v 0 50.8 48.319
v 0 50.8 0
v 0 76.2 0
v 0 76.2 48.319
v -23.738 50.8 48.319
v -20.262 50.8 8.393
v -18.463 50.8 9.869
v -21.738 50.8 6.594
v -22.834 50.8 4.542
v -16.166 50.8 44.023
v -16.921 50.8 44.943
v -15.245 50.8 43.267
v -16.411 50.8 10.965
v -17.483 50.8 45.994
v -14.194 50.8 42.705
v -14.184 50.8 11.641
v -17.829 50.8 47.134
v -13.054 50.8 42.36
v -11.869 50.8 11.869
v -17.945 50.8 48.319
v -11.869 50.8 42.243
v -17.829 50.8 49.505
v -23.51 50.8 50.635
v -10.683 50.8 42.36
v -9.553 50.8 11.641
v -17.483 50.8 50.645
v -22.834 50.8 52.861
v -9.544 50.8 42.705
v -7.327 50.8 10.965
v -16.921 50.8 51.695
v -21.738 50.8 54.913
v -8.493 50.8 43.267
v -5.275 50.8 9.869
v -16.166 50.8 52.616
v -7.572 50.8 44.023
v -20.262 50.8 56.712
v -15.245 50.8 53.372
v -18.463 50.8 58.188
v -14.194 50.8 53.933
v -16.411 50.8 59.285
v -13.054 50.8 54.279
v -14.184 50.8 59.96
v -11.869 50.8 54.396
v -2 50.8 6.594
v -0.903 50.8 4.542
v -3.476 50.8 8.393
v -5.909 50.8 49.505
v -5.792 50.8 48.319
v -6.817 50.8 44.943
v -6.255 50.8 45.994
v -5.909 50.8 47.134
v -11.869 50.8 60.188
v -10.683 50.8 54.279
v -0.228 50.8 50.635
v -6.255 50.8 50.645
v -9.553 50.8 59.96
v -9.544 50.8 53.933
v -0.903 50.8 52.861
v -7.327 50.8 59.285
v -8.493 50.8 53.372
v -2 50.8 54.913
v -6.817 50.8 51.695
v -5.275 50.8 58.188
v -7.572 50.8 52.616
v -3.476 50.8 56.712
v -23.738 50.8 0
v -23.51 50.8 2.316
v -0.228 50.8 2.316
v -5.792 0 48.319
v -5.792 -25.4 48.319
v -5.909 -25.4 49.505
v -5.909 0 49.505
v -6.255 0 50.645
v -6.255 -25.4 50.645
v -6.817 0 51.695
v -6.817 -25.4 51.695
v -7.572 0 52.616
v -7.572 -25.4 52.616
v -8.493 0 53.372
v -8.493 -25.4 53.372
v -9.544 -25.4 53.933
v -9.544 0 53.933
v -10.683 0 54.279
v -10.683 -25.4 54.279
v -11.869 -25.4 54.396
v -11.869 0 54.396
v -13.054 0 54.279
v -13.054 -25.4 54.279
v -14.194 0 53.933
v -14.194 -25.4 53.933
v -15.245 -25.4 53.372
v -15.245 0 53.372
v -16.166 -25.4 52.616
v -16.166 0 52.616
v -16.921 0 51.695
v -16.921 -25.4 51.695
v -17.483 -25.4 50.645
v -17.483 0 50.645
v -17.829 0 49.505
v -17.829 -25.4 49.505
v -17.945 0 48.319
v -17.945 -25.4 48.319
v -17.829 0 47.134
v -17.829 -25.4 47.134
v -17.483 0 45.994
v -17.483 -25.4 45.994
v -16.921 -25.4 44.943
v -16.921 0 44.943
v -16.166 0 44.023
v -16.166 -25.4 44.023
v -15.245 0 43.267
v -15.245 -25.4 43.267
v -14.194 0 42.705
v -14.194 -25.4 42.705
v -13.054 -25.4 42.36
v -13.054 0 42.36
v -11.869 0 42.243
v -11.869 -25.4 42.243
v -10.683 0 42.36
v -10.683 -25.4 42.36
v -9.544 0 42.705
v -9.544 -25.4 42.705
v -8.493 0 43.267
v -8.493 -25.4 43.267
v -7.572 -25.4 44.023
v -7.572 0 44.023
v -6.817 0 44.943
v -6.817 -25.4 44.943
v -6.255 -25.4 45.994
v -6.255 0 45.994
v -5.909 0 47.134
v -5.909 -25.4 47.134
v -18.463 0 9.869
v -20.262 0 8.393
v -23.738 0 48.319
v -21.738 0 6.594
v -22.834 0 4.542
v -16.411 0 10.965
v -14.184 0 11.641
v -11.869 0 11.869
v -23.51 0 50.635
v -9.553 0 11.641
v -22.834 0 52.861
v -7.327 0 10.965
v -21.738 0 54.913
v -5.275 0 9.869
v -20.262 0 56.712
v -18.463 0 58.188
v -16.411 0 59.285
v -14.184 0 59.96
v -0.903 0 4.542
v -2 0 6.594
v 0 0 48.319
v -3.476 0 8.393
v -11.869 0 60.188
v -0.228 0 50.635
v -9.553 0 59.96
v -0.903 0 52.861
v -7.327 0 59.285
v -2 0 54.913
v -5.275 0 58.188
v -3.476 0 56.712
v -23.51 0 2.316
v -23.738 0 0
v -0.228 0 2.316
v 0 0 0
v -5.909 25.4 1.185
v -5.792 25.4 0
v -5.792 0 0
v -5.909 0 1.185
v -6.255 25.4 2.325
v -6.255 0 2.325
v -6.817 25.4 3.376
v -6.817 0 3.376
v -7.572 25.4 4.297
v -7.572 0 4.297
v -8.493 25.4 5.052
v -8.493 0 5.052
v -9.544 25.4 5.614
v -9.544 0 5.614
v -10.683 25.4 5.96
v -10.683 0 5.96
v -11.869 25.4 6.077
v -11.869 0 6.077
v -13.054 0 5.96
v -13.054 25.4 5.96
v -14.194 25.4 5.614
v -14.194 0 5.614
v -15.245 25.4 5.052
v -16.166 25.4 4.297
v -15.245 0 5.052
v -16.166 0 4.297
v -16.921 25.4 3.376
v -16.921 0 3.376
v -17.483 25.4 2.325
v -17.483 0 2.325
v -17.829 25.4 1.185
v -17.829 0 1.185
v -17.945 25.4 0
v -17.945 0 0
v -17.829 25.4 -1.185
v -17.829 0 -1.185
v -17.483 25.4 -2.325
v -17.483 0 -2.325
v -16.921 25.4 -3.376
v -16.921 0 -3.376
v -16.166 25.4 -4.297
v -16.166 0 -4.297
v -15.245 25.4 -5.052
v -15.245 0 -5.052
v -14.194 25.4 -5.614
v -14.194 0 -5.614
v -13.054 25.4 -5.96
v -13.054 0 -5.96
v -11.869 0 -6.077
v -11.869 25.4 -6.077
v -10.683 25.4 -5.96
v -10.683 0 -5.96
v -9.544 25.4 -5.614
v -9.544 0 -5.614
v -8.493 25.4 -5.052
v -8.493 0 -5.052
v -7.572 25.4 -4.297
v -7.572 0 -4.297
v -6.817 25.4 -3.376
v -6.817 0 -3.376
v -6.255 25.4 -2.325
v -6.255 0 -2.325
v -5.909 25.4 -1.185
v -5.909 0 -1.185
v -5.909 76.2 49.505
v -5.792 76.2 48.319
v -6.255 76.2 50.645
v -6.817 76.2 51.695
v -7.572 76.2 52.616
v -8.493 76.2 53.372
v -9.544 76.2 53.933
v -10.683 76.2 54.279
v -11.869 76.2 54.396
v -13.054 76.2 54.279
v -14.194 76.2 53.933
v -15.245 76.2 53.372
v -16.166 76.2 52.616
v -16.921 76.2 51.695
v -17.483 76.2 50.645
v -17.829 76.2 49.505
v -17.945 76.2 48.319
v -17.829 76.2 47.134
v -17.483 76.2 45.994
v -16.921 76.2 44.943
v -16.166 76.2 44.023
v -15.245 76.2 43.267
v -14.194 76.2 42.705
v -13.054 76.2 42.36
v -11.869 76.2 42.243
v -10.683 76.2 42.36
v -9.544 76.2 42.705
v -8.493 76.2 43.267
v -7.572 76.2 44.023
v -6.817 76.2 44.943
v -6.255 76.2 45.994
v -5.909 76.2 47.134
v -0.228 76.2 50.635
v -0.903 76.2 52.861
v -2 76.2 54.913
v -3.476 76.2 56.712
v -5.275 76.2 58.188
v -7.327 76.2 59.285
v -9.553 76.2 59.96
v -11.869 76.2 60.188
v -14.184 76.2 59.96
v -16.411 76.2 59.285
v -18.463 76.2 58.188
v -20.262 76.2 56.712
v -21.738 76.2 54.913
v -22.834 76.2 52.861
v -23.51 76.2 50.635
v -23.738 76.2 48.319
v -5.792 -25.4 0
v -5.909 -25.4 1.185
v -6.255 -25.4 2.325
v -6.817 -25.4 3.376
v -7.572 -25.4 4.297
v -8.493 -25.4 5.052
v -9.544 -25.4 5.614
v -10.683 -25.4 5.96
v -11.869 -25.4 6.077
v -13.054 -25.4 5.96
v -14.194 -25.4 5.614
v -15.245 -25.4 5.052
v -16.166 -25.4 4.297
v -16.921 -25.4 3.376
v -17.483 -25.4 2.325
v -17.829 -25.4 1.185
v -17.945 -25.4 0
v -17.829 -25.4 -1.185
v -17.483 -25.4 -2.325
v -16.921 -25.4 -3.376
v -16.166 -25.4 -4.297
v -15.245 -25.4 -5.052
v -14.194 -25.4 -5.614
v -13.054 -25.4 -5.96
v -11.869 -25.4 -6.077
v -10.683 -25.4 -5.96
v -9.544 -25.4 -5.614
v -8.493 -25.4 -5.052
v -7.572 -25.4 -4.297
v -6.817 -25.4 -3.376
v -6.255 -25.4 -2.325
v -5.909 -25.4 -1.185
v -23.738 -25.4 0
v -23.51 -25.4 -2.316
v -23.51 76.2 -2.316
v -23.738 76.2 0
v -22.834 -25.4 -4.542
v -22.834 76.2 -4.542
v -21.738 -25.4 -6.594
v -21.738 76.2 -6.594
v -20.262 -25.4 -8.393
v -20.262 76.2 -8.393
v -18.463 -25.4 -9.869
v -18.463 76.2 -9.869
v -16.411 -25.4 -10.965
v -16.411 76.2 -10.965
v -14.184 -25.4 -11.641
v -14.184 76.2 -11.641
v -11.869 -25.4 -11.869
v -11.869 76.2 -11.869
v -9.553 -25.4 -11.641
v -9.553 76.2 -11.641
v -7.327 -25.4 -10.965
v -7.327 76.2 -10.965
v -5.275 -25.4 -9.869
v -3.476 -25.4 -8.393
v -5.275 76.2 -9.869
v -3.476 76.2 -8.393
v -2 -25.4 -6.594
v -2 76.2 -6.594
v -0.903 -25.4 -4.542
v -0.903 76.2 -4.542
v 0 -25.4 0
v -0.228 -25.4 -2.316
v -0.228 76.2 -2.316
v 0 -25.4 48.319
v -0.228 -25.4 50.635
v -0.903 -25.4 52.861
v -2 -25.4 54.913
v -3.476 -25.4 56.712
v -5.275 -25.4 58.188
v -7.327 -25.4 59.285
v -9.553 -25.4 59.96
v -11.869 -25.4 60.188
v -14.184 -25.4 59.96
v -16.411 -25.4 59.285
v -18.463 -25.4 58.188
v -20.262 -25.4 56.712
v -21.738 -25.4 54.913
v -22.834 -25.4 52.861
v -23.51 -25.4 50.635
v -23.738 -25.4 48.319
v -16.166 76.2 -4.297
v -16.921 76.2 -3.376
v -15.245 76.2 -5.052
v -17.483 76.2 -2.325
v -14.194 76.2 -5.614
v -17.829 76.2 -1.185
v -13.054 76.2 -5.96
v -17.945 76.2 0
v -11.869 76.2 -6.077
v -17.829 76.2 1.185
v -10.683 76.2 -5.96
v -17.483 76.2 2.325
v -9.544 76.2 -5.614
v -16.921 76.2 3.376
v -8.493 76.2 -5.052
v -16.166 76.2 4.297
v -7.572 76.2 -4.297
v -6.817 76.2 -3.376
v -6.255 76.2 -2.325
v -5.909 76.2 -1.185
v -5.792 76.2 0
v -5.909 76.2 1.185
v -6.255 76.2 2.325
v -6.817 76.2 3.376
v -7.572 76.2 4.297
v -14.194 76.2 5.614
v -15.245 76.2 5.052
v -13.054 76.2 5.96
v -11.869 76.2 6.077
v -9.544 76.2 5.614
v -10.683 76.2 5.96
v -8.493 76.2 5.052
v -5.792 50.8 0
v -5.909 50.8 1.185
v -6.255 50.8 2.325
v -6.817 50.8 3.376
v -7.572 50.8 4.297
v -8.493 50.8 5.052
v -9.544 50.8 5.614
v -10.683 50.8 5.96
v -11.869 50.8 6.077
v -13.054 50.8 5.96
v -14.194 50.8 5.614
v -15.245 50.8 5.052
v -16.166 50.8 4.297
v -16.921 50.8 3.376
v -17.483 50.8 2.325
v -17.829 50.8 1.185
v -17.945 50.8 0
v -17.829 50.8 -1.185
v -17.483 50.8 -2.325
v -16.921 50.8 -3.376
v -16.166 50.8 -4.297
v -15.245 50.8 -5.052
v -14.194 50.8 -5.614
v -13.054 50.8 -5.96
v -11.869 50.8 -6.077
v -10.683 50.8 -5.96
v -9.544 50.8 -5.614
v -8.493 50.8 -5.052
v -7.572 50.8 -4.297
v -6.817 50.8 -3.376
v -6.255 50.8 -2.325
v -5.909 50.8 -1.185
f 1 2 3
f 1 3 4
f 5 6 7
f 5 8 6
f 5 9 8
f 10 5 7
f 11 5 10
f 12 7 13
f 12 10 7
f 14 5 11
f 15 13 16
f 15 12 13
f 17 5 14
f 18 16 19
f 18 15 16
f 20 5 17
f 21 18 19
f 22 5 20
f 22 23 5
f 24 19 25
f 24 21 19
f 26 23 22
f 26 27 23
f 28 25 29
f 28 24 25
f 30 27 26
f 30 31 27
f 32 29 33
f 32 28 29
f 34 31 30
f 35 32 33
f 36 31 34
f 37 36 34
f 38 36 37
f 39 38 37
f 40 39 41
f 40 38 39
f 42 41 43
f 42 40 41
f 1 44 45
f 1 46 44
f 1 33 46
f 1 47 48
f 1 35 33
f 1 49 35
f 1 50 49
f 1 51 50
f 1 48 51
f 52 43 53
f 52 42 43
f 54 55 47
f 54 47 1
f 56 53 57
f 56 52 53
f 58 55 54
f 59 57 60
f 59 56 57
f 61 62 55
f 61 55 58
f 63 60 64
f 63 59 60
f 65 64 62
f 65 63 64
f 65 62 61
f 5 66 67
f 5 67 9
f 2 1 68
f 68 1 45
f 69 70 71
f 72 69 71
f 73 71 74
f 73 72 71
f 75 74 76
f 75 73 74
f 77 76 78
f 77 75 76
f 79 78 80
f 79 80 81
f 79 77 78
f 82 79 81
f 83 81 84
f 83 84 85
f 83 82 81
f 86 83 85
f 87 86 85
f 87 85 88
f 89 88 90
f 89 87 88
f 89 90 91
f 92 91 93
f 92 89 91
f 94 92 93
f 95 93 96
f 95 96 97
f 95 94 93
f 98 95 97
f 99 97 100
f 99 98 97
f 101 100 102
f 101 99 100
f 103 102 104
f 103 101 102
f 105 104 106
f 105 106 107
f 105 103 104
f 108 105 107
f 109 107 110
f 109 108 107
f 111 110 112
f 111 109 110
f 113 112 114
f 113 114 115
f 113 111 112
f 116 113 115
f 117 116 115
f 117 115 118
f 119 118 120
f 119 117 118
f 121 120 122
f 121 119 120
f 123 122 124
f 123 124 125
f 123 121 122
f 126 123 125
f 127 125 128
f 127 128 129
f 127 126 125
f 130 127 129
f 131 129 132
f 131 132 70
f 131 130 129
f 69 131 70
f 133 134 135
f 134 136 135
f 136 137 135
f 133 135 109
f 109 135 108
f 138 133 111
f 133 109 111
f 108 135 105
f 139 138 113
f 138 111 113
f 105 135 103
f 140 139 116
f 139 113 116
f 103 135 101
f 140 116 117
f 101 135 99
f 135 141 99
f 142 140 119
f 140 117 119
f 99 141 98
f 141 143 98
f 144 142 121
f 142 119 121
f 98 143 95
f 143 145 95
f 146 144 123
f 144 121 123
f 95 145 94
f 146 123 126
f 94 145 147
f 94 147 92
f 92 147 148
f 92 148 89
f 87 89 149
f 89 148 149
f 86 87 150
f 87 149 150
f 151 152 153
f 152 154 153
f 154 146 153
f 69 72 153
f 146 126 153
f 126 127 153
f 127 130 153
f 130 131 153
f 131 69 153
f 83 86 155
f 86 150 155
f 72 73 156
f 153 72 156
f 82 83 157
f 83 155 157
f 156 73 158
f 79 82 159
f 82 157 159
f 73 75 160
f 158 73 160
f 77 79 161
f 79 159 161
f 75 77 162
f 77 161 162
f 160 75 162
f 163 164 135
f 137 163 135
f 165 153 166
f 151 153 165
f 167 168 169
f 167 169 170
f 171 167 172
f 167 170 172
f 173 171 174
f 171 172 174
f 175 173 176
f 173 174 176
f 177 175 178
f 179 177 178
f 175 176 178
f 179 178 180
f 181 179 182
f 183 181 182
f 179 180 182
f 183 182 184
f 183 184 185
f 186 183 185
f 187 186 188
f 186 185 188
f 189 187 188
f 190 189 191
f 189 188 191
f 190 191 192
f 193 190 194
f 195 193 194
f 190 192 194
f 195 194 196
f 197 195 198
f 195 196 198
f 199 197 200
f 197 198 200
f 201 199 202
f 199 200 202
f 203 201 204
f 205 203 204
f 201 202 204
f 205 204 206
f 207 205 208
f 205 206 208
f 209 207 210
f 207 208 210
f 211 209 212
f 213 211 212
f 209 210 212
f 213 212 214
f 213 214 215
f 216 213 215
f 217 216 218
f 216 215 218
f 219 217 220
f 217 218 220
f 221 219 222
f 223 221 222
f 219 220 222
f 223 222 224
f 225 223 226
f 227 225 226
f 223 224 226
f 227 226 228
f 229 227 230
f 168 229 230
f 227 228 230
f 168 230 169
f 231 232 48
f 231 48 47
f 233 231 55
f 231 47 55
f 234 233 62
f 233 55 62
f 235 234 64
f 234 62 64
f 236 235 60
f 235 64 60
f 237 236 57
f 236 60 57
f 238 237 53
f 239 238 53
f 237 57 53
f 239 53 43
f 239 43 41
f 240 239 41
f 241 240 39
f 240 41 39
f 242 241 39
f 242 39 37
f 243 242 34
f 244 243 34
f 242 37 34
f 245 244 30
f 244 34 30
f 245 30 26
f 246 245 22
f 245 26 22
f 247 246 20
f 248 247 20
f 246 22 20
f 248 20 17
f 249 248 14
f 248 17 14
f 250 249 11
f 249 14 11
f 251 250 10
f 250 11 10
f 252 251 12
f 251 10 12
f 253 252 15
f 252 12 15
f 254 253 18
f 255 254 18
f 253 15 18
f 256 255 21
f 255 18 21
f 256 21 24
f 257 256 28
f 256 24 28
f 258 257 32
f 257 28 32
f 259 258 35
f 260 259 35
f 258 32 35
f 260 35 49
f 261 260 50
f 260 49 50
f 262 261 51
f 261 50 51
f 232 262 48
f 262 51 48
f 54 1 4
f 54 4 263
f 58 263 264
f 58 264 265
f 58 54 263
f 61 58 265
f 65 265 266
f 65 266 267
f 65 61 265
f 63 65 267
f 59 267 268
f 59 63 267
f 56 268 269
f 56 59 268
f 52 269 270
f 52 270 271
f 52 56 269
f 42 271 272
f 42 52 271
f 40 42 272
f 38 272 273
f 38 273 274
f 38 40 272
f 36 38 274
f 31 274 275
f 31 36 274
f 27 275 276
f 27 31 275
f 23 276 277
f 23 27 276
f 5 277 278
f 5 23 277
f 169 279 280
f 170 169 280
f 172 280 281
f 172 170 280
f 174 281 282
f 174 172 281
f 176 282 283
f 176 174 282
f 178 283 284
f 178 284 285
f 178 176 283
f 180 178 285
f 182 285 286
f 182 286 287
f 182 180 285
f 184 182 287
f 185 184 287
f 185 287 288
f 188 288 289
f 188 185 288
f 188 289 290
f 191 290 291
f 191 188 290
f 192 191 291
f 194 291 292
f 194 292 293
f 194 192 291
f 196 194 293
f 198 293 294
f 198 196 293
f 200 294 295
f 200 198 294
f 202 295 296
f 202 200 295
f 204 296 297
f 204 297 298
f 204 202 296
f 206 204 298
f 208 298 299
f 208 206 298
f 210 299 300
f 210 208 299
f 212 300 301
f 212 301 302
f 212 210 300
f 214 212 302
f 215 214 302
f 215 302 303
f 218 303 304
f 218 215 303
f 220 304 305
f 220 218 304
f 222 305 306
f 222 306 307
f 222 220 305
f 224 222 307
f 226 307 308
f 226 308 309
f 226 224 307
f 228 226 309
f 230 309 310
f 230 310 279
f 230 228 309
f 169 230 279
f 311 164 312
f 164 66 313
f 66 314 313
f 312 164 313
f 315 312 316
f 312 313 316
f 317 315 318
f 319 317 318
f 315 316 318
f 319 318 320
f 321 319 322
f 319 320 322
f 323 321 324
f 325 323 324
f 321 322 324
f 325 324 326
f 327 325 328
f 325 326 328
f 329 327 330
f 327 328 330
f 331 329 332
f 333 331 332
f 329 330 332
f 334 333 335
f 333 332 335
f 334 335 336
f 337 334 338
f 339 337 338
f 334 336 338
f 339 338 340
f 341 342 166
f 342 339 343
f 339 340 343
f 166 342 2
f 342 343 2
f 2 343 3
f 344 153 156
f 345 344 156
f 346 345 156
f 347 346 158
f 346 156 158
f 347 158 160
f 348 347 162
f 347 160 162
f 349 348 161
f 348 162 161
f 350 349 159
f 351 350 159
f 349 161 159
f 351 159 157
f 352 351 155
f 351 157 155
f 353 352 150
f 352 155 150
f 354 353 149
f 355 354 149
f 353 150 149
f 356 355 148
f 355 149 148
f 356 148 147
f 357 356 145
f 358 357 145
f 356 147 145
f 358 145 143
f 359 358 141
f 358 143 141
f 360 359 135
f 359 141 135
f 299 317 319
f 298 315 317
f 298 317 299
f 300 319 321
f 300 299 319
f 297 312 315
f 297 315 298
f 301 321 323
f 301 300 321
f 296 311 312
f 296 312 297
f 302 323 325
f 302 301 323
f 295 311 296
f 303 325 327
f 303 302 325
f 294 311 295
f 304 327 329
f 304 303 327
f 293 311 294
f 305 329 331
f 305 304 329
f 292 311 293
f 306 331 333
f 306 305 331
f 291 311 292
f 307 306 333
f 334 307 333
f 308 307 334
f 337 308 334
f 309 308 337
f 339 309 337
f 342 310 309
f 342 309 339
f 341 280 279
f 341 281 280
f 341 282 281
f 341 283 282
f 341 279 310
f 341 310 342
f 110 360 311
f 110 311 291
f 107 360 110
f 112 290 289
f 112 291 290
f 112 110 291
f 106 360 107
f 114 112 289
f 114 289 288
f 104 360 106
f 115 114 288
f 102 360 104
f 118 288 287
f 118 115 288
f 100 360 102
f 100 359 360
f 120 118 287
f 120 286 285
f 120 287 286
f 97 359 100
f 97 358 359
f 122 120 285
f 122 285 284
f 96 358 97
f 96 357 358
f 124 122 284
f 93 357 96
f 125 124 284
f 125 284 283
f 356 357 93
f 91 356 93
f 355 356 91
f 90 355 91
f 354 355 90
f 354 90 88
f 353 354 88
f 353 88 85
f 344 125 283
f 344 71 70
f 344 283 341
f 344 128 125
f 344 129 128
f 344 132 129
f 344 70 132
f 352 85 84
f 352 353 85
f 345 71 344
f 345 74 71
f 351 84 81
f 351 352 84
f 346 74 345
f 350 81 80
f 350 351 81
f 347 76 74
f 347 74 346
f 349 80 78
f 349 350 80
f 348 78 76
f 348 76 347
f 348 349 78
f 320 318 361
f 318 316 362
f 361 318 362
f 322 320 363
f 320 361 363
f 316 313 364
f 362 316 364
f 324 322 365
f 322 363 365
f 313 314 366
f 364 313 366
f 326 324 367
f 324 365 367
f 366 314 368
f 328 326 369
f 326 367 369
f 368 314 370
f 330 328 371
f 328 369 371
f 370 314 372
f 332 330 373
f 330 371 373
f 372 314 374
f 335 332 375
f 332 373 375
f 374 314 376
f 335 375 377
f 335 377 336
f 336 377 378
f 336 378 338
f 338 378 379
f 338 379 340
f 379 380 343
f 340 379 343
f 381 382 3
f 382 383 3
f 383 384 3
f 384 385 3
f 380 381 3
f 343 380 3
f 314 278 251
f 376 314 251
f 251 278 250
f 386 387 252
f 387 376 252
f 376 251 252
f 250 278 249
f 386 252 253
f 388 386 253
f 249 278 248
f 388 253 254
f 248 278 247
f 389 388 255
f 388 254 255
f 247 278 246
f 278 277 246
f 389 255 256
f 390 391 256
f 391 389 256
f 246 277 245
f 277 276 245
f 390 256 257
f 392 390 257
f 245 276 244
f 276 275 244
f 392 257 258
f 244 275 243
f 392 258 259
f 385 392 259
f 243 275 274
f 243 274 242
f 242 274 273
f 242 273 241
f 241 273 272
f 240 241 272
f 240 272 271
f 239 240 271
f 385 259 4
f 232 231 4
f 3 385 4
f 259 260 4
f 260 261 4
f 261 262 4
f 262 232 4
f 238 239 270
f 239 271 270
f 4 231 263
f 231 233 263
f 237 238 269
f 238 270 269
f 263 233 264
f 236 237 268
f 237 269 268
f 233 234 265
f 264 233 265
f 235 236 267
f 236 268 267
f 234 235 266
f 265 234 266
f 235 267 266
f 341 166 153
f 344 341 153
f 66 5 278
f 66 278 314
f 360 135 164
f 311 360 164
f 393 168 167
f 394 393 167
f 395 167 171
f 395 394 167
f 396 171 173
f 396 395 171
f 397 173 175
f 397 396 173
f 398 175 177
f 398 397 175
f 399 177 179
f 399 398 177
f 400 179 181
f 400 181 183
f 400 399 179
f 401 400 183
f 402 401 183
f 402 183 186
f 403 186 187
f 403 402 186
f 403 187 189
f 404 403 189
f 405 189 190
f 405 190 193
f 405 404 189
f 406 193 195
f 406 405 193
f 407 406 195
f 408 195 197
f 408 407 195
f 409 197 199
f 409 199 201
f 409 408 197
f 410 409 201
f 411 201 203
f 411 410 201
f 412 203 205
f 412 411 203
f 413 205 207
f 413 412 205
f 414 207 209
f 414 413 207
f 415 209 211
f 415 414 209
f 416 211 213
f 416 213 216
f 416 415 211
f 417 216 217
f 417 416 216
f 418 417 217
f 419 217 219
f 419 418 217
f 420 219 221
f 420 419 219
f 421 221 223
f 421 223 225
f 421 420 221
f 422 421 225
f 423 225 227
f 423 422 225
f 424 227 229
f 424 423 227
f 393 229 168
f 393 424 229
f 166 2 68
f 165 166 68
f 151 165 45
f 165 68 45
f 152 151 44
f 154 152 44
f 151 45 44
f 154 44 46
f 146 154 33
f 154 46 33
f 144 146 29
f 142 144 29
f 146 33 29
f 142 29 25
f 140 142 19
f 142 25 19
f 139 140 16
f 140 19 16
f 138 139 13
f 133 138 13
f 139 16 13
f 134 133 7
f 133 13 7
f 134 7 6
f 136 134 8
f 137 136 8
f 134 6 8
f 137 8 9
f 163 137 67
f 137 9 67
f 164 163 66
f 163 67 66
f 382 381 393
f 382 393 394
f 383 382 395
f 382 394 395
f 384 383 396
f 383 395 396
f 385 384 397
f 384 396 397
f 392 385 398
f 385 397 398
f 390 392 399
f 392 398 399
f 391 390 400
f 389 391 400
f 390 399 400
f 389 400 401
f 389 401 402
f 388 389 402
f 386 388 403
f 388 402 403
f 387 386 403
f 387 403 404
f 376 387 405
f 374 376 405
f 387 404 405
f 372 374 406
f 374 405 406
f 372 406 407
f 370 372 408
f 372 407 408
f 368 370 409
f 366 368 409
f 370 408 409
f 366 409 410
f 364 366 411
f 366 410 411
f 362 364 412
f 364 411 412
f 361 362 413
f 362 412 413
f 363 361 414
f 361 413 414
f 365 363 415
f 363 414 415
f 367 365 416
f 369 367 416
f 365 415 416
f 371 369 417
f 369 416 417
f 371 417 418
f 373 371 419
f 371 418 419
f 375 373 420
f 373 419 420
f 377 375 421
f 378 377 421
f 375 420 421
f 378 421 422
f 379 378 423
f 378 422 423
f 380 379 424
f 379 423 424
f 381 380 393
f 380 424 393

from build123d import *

# Parameters (mm, degrees)
F0_R     = 6.076519
F1_DEPTH = 25.4
F2_DEPTH = 25.4


with BuildPart() as f1:
    # F0 (on Front) → F1 (new body)
    with BuildSketch(Plane.XZ):
        with BuildLine():
            ThreePointArc((0, 0), (-11.868954, 11.868954), (-23.737907, 0))
            ThreePointArc((-23.737907, 0), (-11.868954, -11.868954), (0, 0))
        make_face()
        with Locations((-11.868954, 0)):
            Circle(F0_R, mode=Mode.SUBTRACT)
        with BuildLine():
            Line((-23.737907, 48.319295), (-23.737907, 0))
            ThreePointArc((-23.737907, 0), (-11.868954, 11.868954), (0, 0))
            Line((0, 0), (0, 48.319295))
            ThreePointArc((0, 48.319295), (-11.868954, 60.188249), (-23.737907, 48.319295))
        make_face()
        with Locations((-11.868954, 48.319295)):
            Circle(F0_R, mode=Mode.SUBTRACT)
    extrude(amount=F1_DEPTH)

    # F0 (on Front) → F2 (join)
    with BuildSketch(Plane.XZ):
        with BuildLine():
            ThreePointArc((0, 0), (-11.868954, 11.868954), (-23.737907, 0))
            ThreePointArc((-23.737907, 0), (-11.868954, -11.868954), (0, 0))
        make_face()
        with Locations((-11.868954, 0)):
            Circle(F0_R, mode=Mode.SUBTRACT)
    extrude(amount=-F2_DEPTH)

    # F3: F1 across face


with BuildPart() as f1_1:
    add(f1.part)
    add(f1.part.mirror(Plane(origin=(-11.868954, 25.4, 0), x_dir=(1, 0, 0), z_dir=(0, 1, 0))))


solid = f1_1.part
